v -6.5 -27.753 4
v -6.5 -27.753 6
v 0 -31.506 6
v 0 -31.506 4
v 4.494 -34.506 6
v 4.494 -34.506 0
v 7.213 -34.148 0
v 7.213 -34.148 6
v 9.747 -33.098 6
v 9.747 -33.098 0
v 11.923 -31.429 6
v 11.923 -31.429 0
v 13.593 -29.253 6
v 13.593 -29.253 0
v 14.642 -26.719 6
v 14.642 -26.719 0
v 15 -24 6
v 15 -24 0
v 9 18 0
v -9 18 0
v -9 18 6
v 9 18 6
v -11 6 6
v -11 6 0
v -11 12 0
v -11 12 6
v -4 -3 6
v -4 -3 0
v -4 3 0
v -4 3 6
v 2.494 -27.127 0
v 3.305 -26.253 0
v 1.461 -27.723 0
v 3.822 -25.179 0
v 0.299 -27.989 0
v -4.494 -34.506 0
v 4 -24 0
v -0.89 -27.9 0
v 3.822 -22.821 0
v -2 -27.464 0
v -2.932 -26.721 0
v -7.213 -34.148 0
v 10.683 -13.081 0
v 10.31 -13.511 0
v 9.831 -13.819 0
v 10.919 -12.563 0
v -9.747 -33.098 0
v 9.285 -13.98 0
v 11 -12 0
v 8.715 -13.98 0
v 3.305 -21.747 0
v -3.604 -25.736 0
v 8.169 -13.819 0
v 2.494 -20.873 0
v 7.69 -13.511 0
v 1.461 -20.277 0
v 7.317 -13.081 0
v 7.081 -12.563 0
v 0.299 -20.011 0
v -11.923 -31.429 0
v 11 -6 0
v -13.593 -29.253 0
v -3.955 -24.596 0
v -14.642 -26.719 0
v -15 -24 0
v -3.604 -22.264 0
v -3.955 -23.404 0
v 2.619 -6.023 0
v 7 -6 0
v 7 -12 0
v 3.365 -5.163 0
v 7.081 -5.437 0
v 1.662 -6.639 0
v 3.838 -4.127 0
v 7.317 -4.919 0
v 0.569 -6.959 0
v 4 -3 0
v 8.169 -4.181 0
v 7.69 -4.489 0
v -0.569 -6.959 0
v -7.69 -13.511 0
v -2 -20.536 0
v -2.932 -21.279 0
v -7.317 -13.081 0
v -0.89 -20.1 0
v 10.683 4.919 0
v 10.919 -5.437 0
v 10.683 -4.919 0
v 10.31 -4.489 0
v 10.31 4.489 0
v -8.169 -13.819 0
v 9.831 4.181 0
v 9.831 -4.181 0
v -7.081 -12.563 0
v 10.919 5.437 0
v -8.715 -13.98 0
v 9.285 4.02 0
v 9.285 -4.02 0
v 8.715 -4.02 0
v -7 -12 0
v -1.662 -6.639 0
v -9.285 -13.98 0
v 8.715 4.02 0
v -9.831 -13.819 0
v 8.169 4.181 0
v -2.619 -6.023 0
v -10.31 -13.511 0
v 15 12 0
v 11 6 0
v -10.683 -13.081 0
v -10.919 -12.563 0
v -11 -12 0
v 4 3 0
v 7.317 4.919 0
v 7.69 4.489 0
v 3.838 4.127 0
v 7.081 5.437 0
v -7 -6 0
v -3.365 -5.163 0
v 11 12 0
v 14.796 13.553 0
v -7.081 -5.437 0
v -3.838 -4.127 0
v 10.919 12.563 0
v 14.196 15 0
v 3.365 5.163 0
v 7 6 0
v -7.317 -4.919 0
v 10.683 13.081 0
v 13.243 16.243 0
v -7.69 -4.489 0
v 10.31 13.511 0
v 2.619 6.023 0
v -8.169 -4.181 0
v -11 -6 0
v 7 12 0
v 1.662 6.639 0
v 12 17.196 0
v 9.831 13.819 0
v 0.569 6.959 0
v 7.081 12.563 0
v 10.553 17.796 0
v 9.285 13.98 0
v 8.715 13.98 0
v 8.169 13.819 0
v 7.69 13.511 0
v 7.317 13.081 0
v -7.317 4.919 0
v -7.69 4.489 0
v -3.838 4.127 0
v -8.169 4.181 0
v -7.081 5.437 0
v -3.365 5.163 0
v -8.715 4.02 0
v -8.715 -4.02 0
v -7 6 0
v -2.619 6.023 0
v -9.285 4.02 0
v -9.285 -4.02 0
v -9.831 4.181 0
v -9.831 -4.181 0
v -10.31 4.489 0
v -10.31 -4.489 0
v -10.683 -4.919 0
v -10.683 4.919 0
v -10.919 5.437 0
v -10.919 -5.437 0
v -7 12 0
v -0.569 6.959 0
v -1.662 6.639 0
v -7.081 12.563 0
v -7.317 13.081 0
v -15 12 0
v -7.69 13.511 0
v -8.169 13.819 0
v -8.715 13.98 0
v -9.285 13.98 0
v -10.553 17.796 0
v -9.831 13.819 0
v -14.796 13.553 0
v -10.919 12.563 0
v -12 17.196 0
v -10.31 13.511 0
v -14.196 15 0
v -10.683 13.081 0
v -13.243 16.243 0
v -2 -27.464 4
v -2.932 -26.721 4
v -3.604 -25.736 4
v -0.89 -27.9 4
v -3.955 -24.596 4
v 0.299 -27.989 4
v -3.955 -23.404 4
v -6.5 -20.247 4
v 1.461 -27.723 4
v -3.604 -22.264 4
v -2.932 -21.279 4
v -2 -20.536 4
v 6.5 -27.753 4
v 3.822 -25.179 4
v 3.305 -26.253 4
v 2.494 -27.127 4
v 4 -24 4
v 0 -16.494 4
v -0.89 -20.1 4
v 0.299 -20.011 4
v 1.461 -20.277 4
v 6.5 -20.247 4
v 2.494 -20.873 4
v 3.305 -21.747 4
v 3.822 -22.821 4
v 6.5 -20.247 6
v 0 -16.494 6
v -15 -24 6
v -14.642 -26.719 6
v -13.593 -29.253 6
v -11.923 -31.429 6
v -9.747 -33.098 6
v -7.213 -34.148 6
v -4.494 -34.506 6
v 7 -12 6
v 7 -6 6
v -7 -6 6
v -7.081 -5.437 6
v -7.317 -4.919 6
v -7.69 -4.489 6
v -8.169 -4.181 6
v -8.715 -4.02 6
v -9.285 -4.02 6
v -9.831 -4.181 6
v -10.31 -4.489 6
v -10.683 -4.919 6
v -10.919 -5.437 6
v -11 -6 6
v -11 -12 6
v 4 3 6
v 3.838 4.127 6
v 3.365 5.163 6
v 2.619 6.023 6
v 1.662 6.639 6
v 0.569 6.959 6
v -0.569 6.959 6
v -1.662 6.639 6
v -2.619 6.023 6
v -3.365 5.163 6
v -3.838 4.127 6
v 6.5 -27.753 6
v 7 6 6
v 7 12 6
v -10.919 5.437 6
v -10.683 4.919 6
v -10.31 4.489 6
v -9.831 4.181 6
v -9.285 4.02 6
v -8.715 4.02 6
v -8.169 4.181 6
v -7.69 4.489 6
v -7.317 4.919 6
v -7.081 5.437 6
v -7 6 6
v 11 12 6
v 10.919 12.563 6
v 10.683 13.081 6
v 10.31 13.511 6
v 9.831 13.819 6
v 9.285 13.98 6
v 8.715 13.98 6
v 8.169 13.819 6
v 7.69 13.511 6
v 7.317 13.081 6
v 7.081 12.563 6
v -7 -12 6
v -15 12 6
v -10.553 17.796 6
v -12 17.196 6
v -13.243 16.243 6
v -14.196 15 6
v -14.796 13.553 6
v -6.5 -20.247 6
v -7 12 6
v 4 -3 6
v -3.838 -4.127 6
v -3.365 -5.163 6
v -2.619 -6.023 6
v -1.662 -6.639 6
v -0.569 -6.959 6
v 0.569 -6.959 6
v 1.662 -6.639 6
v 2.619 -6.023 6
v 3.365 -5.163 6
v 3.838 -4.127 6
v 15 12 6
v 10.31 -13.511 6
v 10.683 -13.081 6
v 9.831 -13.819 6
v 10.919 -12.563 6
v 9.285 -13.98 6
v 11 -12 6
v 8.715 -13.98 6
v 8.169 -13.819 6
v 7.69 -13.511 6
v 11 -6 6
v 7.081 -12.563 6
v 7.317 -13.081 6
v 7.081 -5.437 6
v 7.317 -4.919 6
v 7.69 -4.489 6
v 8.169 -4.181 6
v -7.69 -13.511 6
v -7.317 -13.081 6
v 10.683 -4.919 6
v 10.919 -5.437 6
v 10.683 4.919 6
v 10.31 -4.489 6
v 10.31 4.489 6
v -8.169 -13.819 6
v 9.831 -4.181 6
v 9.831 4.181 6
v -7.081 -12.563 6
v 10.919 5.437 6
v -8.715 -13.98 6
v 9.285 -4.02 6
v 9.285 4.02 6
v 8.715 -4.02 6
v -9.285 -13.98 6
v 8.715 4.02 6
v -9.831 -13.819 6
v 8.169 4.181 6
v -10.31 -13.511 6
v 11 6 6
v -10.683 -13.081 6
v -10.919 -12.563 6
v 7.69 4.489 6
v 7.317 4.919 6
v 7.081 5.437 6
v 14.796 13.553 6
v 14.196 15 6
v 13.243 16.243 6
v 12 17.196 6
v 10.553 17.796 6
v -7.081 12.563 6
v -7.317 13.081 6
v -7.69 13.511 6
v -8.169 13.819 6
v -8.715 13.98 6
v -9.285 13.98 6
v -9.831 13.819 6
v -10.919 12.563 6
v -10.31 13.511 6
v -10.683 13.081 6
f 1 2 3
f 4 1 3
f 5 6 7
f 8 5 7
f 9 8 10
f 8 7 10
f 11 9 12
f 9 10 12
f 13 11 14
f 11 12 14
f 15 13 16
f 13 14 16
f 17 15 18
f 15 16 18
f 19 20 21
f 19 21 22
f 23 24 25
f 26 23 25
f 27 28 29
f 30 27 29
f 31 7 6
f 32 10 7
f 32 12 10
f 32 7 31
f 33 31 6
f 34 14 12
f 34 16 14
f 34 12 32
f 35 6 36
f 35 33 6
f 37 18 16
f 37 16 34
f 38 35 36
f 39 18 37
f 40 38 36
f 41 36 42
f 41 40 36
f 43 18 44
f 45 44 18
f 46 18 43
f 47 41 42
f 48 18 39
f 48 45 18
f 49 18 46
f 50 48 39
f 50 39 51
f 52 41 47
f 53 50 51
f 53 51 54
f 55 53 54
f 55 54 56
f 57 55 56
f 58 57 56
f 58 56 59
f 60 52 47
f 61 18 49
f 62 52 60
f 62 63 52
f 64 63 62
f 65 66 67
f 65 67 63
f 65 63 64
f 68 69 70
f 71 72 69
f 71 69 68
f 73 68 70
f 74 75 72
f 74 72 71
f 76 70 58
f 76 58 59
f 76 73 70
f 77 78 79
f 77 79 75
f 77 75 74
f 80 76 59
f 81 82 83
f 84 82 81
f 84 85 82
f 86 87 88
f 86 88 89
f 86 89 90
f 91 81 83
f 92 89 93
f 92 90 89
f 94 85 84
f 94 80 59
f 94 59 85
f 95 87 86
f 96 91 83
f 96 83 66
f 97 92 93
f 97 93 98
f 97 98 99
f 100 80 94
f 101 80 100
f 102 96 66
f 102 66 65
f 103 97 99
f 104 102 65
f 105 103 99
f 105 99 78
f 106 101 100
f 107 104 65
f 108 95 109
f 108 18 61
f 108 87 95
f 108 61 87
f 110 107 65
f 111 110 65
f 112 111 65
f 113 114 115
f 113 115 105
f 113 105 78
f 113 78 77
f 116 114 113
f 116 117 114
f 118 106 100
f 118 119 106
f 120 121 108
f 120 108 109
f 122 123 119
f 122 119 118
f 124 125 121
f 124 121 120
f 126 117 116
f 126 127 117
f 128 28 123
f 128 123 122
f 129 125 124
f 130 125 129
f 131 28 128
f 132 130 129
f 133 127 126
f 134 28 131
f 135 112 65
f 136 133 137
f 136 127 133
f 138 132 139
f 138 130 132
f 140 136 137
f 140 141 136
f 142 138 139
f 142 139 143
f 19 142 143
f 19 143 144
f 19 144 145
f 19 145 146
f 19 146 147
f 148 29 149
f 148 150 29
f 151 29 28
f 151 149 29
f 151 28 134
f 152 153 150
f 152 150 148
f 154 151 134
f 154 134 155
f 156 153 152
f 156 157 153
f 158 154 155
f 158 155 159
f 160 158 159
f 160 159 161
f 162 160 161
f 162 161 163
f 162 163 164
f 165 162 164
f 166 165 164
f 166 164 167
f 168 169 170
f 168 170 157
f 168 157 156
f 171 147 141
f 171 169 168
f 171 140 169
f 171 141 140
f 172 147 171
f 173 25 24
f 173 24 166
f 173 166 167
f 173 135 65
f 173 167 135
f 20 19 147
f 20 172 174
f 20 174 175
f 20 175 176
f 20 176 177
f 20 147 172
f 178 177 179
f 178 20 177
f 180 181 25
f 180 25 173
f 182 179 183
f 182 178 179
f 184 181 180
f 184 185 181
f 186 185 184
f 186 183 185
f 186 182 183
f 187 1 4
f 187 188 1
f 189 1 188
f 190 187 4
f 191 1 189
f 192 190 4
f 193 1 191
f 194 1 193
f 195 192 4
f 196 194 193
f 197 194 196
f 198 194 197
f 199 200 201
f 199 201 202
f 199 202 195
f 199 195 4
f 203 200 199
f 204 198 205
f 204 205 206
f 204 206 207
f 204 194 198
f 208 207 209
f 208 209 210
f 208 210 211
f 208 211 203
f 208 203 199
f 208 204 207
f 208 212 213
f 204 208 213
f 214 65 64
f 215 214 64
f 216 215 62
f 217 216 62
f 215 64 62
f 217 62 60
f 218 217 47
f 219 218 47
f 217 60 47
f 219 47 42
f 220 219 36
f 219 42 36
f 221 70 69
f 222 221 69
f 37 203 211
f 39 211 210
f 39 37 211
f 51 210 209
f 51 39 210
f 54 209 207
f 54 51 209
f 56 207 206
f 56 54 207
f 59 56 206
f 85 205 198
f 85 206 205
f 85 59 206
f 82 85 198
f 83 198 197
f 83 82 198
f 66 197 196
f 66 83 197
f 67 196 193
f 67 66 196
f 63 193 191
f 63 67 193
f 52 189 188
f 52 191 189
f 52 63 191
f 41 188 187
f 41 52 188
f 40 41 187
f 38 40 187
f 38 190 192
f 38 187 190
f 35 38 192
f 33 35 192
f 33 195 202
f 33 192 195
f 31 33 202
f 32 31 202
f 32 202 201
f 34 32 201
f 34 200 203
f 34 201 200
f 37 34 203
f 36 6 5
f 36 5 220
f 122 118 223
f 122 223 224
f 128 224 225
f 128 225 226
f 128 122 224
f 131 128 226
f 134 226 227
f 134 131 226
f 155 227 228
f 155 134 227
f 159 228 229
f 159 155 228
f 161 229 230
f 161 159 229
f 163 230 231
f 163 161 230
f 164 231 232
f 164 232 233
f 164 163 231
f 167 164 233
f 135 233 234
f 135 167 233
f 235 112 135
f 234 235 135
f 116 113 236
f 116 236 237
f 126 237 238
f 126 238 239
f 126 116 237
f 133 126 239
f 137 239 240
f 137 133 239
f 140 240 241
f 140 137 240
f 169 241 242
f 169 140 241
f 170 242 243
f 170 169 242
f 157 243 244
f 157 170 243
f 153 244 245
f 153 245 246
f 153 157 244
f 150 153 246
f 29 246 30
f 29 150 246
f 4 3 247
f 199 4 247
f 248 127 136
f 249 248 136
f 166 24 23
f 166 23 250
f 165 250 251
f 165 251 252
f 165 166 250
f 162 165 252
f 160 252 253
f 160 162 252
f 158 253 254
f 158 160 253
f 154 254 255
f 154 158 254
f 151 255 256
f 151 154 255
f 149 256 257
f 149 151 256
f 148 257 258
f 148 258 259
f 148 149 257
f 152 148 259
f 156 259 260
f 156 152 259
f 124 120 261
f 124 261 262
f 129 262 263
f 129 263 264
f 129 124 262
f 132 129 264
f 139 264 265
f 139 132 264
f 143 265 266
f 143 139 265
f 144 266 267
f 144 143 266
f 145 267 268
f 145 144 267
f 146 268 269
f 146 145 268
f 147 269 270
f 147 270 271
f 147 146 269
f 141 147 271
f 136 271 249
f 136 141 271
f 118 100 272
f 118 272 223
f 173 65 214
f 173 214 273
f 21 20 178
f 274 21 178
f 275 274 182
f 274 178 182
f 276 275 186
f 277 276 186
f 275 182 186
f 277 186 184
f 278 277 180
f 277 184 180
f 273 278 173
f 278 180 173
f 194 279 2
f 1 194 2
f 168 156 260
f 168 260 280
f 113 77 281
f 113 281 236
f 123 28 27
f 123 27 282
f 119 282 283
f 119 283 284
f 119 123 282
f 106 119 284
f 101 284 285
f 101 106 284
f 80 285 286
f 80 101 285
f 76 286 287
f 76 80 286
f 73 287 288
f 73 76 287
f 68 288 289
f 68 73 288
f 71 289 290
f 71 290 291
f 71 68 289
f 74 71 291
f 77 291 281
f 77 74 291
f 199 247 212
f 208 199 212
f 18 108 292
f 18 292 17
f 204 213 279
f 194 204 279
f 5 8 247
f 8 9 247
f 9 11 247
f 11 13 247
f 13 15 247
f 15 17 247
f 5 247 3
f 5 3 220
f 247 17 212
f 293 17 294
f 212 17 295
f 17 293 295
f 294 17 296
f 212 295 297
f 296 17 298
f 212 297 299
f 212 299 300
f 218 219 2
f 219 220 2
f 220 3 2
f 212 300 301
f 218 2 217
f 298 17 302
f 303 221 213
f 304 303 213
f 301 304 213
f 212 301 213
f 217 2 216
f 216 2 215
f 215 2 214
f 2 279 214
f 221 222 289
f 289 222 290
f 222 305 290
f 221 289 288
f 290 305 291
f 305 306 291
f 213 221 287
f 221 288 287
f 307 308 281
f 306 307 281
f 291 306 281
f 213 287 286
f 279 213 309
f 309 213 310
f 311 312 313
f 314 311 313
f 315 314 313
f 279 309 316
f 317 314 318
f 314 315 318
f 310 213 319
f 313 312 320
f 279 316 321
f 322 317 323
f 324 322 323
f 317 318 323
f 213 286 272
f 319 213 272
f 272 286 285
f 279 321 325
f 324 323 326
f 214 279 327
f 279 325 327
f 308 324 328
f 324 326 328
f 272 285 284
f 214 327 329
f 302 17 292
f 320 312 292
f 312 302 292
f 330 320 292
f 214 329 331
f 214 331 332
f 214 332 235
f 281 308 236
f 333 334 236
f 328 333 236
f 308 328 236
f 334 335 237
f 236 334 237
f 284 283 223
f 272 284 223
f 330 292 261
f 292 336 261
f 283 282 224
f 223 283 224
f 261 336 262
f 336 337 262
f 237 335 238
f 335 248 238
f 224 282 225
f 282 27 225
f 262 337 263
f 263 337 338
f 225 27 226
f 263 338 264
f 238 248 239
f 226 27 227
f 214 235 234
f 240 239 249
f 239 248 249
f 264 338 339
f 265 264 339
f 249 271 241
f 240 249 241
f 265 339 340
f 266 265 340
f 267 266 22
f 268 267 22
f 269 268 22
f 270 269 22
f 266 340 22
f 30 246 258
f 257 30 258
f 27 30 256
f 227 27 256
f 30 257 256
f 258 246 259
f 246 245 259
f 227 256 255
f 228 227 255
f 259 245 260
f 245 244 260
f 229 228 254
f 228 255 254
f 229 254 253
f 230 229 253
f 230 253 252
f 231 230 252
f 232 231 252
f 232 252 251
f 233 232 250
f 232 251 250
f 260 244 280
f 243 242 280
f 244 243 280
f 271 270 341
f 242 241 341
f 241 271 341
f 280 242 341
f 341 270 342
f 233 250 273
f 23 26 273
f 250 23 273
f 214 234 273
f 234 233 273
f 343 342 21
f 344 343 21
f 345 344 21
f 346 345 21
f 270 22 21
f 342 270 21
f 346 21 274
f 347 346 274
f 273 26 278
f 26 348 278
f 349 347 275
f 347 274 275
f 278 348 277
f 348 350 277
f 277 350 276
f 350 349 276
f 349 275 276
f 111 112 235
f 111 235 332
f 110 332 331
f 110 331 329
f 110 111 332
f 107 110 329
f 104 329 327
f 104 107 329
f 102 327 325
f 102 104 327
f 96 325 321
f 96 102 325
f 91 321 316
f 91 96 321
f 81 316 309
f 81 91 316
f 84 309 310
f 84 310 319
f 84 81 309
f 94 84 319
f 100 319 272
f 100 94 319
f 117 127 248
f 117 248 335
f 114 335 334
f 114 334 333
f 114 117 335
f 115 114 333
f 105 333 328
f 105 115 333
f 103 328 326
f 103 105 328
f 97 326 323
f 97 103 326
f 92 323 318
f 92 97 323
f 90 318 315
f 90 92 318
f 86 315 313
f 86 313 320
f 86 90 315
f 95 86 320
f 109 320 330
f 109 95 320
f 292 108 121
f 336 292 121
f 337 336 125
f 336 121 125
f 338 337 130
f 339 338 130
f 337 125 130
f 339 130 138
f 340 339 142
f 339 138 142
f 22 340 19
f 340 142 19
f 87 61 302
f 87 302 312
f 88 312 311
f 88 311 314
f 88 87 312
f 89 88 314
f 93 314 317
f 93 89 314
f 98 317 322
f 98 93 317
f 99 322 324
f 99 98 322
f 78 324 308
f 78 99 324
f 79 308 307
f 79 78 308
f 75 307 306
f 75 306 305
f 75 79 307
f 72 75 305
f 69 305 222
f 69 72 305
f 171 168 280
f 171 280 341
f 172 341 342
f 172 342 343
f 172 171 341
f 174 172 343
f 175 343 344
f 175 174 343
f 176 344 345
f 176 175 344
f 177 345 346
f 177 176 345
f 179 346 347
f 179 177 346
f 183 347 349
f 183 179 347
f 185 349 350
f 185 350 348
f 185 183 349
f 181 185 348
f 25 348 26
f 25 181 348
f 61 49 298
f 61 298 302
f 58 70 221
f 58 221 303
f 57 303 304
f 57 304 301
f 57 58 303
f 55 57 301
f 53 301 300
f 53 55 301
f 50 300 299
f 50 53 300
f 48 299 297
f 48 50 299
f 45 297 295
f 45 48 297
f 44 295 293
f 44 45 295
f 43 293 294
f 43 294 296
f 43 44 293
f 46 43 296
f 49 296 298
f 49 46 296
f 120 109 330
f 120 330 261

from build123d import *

# Parameters (mm, degrees)
SKETCH_R     = 4
PAD_DEPTH    = 6
POCKET_DEPTH = 2


with BuildPart() as part:
    # Sketch → Pad (new body)
    with BuildSketch(Plane.XY):
        with BuildLine():
            Line((-9, 18), (9, 18))
            ThreePointArc((15, 12), (13.242641, 16.242641), (9, 18))
            Line((15, 12), (15, -24))
            ThreePointArc((4.494447, -34.505553), (11.922995, -31.428548), (15, -24))
            Line((4.494447, -34.505553), (-4.494447, -34.505553))
            ThreePointArc((-15, -24), (-11.922995, -31.428548), (-4.494447, -34.505553))
            Line((-15, -24), (-15, 12))
            ThreePointArc((-9, 18), (-13.242641, 16.242641), (-15, 12))
        make_face()
        with Locations((0, -24)):
            Circle(SKETCH_R, mode=Mode.SUBTRACT)
        with BuildLine():
            ThreePointArc((7, 6), (9, 4), (11, 6))
            Line((11, 6), (11, 12))
            ThreePointArc((11, 12), (9, 14), (7, 12))
            Line((7, 6), (7, 12))
        make_face(mode=Mode.SUBTRACT)
        with BuildLine():
            ThreePointArc((-11, 6), (-9, 4), (-7, 6))
            Line((-7, 6), (-7, 12))
            ThreePointArc((-7, 12), (-9, 14), (-11, 12))
            Line((-11, 6), (-11, 12))
        make_face(mode=Mode.SUBTRACT)
        with BuildLine():
            ThreePointArc((7, -12), (9, -14), (11, -12))
            Line((11, -12), (11, -6))
            ThreePointArc((11, -6), (9, -4), (7, -6))
            Line((7, -12), (7, -6))
        make_face(mode=Mode.SUBTRACT)
        with BuildLine():
            ThreePointArc((-11, -12), (-9, -14), (-7, -12))
            Line((-7, -12), (-7, -6))
            ThreePointArc((-7, -6), (-9, -4), (-11, -6))
            Line((-11, -12), (-11, -6))
        make_face(mode=Mode.SUBTRACT)
        with BuildLine():
            ThreePointArc((-4, -3), (0, -7), (4, -3))
            Line((4, -3), (4, 3))
            ThreePointArc((4, 3), (0, 7), (-4, 3))
            Line((-4, -3), (-4, 3))
        make_face(mode=Mode.SUBTRACT)
    extrude(amount=PAD_DEPTH)

    # Sketch001 (on Face31 of Pad) → Pocket (cut)
    with BuildSketch(Plane.XY.offset(6)):
        Polygon((6.5, -20.247223), (0, -16.494447), (-6.5, -20.247223), (-6.5, -27.752777), (0, -31.505553), (6.5, -27.752777), align=None)
    extrude(amount=-POCKET_DEPTH, mode=Mode.SUBTRACT)


solid = part.part
